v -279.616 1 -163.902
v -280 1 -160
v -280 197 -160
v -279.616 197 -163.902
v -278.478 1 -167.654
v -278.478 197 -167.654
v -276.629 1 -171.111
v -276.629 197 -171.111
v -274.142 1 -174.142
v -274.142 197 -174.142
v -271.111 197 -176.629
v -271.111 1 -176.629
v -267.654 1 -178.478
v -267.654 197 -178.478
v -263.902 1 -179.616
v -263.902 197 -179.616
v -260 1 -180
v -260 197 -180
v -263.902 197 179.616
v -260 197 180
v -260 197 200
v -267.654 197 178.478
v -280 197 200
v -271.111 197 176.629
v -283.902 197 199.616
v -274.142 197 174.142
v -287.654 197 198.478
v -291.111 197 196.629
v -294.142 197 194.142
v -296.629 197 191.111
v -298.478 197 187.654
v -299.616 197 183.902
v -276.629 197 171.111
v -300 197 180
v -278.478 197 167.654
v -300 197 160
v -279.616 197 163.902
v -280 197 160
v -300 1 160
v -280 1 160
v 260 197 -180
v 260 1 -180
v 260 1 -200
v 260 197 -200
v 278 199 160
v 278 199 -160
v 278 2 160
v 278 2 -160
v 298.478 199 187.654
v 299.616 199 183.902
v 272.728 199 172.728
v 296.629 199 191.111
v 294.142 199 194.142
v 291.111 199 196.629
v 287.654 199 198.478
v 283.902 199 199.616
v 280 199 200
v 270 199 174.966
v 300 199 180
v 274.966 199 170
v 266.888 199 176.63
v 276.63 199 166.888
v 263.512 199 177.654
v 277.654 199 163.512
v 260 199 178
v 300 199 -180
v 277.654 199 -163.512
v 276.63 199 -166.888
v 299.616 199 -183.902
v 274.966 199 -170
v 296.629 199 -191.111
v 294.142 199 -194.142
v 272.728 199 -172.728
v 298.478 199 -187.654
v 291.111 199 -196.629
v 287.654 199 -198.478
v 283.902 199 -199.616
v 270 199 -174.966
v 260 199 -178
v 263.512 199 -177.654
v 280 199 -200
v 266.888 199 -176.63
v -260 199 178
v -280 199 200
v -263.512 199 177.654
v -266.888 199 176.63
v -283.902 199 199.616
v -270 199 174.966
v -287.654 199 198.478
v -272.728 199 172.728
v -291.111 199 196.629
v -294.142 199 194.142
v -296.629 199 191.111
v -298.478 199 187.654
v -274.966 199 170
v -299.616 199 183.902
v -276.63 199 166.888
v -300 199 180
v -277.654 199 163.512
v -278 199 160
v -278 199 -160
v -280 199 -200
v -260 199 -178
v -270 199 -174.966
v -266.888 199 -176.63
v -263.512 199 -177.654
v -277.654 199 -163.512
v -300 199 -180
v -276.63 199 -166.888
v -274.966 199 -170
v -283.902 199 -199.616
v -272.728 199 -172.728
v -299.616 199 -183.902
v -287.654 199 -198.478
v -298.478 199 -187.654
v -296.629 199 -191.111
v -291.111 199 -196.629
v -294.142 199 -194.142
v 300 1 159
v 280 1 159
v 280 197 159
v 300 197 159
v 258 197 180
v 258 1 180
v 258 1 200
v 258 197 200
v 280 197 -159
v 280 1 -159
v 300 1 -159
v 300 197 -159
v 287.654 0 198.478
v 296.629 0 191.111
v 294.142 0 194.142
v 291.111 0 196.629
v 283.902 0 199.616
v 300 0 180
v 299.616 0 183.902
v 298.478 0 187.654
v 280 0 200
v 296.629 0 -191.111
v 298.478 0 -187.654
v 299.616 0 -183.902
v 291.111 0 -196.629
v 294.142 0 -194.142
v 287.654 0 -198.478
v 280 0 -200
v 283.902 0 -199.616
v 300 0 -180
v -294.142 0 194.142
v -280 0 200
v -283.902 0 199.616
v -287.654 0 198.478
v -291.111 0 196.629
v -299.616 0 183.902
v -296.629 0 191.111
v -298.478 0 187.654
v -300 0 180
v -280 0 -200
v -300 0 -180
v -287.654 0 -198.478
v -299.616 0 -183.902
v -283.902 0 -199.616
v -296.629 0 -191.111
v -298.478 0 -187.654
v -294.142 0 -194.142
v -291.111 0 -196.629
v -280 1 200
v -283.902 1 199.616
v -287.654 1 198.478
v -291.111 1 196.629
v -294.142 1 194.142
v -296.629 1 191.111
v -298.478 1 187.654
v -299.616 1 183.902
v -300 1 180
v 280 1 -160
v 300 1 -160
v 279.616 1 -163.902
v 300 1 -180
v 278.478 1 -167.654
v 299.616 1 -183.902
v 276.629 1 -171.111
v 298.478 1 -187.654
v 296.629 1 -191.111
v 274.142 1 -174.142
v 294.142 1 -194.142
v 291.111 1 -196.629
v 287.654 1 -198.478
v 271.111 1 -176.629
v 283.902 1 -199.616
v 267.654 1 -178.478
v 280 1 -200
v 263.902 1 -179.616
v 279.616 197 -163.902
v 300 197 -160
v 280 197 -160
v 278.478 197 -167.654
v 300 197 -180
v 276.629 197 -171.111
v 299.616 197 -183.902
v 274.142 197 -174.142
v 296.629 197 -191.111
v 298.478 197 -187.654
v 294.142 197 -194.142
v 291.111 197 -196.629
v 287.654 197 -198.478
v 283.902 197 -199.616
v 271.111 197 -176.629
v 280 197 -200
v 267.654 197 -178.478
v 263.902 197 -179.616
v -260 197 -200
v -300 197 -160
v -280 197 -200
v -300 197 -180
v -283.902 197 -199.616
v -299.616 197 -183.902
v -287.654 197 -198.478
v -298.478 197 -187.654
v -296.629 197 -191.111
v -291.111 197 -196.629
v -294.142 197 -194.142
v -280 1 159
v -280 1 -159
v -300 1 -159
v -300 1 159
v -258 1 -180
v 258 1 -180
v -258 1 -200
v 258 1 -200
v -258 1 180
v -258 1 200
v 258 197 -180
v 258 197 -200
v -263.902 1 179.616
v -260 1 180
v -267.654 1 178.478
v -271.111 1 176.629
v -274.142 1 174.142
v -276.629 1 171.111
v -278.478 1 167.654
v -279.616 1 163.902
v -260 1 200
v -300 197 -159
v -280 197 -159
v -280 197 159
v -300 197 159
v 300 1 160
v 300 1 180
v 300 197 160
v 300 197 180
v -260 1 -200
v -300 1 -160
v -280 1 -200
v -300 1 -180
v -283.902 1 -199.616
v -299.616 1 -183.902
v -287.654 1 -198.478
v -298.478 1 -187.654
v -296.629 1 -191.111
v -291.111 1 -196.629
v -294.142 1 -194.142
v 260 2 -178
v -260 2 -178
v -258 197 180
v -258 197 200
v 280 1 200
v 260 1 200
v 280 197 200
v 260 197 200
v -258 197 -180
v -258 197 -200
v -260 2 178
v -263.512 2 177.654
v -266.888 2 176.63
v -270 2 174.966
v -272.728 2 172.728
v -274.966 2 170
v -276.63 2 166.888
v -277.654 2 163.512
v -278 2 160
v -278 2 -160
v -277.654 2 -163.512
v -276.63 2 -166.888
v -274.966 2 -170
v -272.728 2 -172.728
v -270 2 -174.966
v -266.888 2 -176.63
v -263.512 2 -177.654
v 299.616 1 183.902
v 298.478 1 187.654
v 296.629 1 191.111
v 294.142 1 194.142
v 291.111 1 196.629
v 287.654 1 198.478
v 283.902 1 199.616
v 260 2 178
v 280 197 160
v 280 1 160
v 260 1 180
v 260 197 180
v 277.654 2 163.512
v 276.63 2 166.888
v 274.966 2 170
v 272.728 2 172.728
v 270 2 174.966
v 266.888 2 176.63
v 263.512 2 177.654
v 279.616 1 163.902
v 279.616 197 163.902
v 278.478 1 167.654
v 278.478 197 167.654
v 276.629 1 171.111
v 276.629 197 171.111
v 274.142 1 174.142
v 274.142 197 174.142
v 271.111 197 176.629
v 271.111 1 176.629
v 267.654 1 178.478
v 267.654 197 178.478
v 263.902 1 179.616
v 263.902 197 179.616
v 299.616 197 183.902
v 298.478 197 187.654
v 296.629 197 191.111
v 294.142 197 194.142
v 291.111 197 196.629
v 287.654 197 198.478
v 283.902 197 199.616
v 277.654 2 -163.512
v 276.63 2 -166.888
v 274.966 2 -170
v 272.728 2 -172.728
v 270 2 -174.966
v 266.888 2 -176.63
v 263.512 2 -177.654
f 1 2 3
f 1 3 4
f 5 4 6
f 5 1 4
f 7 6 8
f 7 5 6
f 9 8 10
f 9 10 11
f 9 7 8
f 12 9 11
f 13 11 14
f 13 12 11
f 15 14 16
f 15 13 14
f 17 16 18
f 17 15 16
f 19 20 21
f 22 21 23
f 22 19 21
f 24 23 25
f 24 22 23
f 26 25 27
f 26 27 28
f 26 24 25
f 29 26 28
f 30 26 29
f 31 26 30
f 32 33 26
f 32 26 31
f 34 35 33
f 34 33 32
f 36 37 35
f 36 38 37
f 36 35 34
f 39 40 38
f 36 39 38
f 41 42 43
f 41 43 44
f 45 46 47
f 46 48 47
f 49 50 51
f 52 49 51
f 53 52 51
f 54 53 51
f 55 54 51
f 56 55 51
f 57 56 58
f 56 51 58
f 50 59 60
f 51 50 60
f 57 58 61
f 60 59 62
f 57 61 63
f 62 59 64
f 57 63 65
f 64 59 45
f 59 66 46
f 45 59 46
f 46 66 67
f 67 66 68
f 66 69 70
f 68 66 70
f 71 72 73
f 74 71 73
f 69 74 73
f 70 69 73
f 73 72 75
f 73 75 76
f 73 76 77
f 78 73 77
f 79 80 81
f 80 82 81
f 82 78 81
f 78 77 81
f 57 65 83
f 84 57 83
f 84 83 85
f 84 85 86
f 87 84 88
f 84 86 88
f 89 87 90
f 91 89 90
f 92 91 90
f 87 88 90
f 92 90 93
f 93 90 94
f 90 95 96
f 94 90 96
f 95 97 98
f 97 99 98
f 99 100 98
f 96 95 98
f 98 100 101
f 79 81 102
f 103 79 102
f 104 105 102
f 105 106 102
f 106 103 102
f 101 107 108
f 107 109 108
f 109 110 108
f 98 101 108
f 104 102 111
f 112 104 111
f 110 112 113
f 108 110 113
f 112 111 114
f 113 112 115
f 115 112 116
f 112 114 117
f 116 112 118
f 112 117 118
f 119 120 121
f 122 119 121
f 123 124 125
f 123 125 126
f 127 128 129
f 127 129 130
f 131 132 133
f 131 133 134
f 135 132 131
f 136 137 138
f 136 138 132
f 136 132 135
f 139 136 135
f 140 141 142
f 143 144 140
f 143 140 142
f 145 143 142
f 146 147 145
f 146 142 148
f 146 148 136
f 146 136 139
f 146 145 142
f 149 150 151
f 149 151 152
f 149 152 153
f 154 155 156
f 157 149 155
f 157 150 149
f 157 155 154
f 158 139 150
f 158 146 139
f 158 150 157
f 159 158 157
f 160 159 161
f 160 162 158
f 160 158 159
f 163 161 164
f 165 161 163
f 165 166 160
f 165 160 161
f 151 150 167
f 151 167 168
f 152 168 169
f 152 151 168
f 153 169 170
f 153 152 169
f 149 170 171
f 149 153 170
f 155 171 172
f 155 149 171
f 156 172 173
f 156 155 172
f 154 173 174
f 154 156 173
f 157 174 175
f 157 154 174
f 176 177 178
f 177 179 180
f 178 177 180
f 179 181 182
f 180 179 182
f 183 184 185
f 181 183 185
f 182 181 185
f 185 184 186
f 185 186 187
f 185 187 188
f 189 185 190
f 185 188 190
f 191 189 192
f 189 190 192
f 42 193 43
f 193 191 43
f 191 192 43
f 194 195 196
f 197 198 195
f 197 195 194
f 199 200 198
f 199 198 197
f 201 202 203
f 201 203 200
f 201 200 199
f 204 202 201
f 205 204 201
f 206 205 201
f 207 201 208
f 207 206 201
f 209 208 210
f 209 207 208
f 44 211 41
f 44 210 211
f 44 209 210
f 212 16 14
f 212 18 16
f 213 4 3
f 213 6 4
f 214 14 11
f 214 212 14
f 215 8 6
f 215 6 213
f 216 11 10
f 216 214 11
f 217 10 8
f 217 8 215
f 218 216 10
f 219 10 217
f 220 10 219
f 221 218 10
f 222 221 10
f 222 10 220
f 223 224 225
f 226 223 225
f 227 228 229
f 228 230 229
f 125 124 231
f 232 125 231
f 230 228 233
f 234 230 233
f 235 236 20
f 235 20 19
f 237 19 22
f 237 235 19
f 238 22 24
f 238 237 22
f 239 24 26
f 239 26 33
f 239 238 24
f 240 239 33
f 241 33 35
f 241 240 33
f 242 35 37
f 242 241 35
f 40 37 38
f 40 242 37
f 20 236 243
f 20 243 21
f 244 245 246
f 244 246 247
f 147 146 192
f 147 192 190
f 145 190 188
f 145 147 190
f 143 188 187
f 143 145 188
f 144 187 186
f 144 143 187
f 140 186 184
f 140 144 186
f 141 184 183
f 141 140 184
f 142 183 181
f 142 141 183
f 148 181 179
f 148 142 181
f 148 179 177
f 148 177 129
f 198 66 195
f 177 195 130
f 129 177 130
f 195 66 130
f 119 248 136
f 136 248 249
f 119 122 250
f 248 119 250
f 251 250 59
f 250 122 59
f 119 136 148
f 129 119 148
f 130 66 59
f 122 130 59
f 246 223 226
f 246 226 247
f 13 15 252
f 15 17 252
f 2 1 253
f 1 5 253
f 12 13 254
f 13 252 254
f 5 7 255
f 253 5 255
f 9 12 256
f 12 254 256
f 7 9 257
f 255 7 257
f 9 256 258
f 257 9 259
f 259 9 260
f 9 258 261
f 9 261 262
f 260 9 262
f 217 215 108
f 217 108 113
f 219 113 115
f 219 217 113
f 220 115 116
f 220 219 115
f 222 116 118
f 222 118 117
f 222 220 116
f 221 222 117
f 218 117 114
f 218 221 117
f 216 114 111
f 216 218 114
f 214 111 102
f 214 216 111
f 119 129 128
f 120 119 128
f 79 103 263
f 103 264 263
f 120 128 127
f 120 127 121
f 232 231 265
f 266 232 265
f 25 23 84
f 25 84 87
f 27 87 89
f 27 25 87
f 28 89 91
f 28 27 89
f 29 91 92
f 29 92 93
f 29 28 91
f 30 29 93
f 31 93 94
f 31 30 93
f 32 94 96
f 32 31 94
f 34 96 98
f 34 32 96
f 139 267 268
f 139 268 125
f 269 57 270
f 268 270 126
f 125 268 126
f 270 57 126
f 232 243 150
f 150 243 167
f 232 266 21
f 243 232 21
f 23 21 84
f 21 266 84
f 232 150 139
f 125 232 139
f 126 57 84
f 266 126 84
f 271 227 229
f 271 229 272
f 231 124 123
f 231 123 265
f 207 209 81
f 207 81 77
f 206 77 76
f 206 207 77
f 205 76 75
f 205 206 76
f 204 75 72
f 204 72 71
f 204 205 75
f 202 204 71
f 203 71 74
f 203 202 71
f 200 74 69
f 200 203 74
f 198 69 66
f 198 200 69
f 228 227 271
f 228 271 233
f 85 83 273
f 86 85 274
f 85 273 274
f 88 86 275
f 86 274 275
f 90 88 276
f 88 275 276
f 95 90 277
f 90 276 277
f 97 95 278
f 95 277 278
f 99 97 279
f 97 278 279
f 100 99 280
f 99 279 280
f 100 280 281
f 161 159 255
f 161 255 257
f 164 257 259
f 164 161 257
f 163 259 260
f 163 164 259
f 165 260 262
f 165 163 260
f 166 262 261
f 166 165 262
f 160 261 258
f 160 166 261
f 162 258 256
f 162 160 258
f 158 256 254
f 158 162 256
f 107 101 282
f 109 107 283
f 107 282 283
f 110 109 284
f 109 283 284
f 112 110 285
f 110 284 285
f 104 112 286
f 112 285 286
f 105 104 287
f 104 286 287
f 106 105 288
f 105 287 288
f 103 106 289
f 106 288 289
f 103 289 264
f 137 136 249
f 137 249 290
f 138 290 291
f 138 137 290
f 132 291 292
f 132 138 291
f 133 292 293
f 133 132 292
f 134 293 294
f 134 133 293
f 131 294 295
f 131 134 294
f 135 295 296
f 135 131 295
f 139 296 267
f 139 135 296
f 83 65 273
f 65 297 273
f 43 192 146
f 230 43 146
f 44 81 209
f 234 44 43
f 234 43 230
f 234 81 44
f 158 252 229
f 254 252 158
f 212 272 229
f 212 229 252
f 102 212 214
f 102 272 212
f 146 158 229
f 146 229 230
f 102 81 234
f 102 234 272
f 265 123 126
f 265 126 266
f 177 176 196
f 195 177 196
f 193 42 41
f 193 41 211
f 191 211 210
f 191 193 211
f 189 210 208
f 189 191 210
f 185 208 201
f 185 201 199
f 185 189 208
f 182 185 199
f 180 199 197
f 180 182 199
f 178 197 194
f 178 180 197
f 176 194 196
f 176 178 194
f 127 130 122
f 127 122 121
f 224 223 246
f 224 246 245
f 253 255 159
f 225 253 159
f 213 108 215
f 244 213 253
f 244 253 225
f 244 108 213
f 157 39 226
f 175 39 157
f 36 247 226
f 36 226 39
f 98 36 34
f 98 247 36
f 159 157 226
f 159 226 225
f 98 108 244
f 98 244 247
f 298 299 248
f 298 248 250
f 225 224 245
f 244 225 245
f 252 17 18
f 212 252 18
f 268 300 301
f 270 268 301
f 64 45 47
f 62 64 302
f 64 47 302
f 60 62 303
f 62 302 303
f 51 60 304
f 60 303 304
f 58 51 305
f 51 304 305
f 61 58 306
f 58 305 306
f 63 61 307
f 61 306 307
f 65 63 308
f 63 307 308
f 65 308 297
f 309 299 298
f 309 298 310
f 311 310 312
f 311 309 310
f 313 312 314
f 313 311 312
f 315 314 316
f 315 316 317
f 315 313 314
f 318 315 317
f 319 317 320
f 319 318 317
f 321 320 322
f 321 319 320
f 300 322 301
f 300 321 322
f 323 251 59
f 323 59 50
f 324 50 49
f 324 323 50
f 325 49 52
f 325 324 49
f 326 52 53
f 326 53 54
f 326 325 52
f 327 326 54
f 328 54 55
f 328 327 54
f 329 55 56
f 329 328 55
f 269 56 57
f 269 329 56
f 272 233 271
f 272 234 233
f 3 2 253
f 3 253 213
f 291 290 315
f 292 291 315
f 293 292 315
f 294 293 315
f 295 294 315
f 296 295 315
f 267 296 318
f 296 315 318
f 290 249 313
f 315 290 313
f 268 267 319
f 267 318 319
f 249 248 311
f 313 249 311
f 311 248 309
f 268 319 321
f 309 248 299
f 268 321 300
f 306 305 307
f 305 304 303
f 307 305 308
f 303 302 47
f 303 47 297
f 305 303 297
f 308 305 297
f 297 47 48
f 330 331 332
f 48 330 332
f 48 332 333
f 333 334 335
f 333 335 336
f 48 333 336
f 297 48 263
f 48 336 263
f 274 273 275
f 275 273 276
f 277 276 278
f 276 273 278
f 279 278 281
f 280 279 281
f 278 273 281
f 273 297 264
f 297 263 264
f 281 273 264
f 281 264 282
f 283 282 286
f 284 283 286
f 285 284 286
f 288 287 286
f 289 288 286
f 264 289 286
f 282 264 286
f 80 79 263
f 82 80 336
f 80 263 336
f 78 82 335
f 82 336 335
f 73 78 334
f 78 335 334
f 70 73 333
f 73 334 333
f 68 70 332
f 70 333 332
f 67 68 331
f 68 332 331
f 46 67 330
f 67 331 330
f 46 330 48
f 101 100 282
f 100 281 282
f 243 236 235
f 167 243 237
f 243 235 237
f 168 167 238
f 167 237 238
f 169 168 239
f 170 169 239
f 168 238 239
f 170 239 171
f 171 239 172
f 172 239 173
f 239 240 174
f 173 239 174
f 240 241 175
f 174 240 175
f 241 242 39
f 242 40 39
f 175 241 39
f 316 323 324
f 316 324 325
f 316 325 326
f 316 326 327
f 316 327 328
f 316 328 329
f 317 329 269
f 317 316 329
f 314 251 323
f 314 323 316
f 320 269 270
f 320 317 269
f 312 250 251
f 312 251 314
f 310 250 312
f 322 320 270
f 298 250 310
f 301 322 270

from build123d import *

# Parameters (mm, degrees)
BOSS_EXTRU_4_DEPTH        = 1
BOSS_EXTRU_5_DEPTH        = 198
COQUE2_T                  = -2
BOSS_EXTRU_6_DEPTH        = 2
ENL_V_START               = -2
ENL_V_MAT_EXTRU_3_DEPTH   = 2
ESQUISSE18_W              = 1
ESQUISSE18_H              = 196
BOSS_EXTRU_7_DEPTH        = 20
SYM_TRIE3_COPY_1_SKETCH_W = 1
SYM_TRIE3_COPY_1_SKETCH_H = 196
SYM_TRIE3_COPY_1_DEPTH    = 20
ESQUISSE19_W              = 2
ESQUISSE19_H              = 196
BOSS_EXTRU_8_DEPTH        = 20
SYM_TRIE5_COPY_1_SKETCH_W = 2
SYM_TRIE5_COPY_1_SKETCH_H = 196
SYM_TRIE5_COPY_1_DEPTH    = 20


with BuildPart() as part:
    # Esquisse1 → Boss.-Extru.4 (new body)
    with BuildSketch(Plane(origin=(0, 0, 0), x_dir=(1, 0, 0), z_dir=(0, 1, 0))):
        with BuildLine():
            Line((-280, 200), (280, 200))
            ThreePointArc((280, 200), (294.142135624, 194.142135624), (300, 180))
            Line((300, 180), (300, -180))
            ThreePointArc((300, -180), (294.142135624, -194.142135624), (280, -200))
            Line((280, -200), (-280, -200))
            ThreePointArc((-280, -200), (-294.142135624, -194.142135624), (-300, -180))
            Line((-300, -180), (-300, 180))
            ThreePointArc((-300, 180), (-294.142135624, 194.142135624), (-280, 200))
        make_face()
    boss_extru_4 = extrude(amount=BOSS_EXTRU_4_DEPTH)

    # Esquisse3 → Boss.-Extru.5 (add)
    with BuildSketch(Plane(origin=(0, 1, 0), x_dir=(1, 0, 0), z_dir=(0, 1, 0))):
        with BuildLine():
            Line((-260, 180), (260, 180))
            ThreePointArc((260, 180), (274.142135624, 174.142135624), (280, 160))
            Line((280, 160), (280, -160))
            ThreePointArc((280, -160), (274.142135624, -174.142135624), (260, -180))
            Line((260, -180), (-260, -180))
            ThreePointArc((-260, -180), (-274.142135624, -174.142135624), (-280, -160))
            Line((-280, -160), (-280, 160))
            ThreePointArc((-280, 160), (-274.142135624, 174.142135624), (-260, 180))
        make_face()
    extrude(amount=BOSS_EXTRU_5_DEPTH)

    # Coque2
    coque2_openings = [part.faces().sort_by_distance(p)[0] for p in [
        (0, 199, 0),
    ]]
    offset(amount=COQUE2_T, openings=coque2_openings, kind=Kind.INTERSECTION)



with BuildPart() as body_2:
    # Esquisse12 → Boss.-Extru.6 (new body)
    with BuildSketch(Plane(origin=(0, 197, 0), x_dir=(1, 0, 0), z_dir=(0, 1, 0))):
        with BuildLine():
            Line((-280, 200), (280, 200))
            ThreePointArc((280, 200), (294.142135624, 194.142135624), (300, 180))
            Line((300, 180), (300, -180))
            ThreePointArc((300, -180), (294.142135624, -194.142135624), (280, -200))
            Line((280, -200), (-280, -200))
            ThreePointArc((-280, -200), (-294.142135624, -194.142135624), (-300, -180))
            Line((-300, -180), (-300, 180))
            ThreePointArc((-300, 180), (-294.142135624, 194.142135624), (-280, 200))
        make_face()
    extrude(amount=BOSS_EXTRU_6_DEPTH)

    # Esquisse17 → Enlèv. mat.-Extru.3 (cut)
    with BuildSketch(Plane(origin=(0, 199, 0), x_dir=(1, 0, 0), z_dir=(0, 1, 0)).offset(ENL_V_START)):
        with BuildLine():
            Line((-260, 180), (260, 180))
            ThreePointArc((260, 180), (274.142135624, 174.142135624), (280, 160))
            Line((280, 160), (280, -160))
            ThreePointArc((280, -160), (274.142135624, -174.142135624), (260, -180))
            Line((260, -180), (-260, -180))
            ThreePointArc((-260, -180), (-274.142135624, -174.142135624), (-280, -160))
            Line((-280, -160), (-280, 160))
            ThreePointArc((-280, 160), (-274.142135624, 174.142135624), (-260, 180))
        make_face()
    extrude(amount=ENL_V_MAT_EXTRU_3_DEPTH, mode=Mode.SUBTRACT)


with BuildPart() as part_1:
    add(part.part)

    add(body_2.part)  # Boss.-Extru.7 merges body 2
    # Esquisse18 → Boss.-Extru.7 (add)
    with BuildSketch(Plane(origin=(280, 0, 0), x_dir=(0, 0, -1), z_dir=(1, 0, 0))):
        with Locations((-159.5, 99)):
            Rectangle(ESQUISSE18_W, ESQUISSE18_H)
    boss_extru_7 = extrude(amount=BOSS_EXTRU_7_DEPTH)


with BuildPart() as sym_trie1_1:
    # Symétrie1: Boss.-Extru.4 across plane
    add(boss_extru_4.mirror(Plane.XY))


with BuildPart() as part_2:
    add(part_1.part)

    # Symétrie1 united with what the copies to: union Symétrie1_1
    add(sym_trie1_1.part)

    # Symétrie2: Boss.-Extru.7 across plane
    add(boss_extru_7.mirror(Plane.XY))

    # Symétrie3: Boss.-Extru.7 across plane
    add(boss_extru_7.mirror(Plane(origin=(0, 0, 0), x_dir=(0, 0, 1), z_dir=(1, 0, 0))))

    # Symétrie3 copy 1 sketch → Symétrie3 copy 1 (add)
    with BuildSketch(Plane.ZY.offset(280)):
        with Locations((-159.5, 99)):
            Rectangle(SYM_TRIE3_COPY_1_SKETCH_W, SYM_TRIE3_COPY_1_SKETCH_H)
    extrude(amount=SYM_TRIE3_COPY_1_DEPTH)

    # Esquisse19 → Boss.-Extru.8 (add)
    with BuildSketch(Plane.XY.offset(180)):
        with Locations((-259, 99)):
            Rectangle(ESQUISSE19_W, ESQUISSE19_H)
    boss_extru_8 = extrude(amount=BOSS_EXTRU_8_DEPTH)

    # Symétrie4: Boss.-Extru.8 across plane
    add(boss_extru_8.mirror(Plane(origin=(0, 0, 0), x_dir=(0, 0, 1), z_dir=(1, 0, 0))))

    # Symétrie5: Boss.-Extru.8 across plane
    add(boss_extru_8.mirror(Plane.XY))

    # Symétrie5 copy 1 sketch → Symétrie5 copy 1 (add)
    with BuildSketch(Plane(origin=(0, 0, -180), x_dir=(-1, 0, 0), z_dir=(0, 0, -1))):
        with Locations((-259, 99)):
            Rectangle(SYM_TRIE5_COPY_1_SKETCH_W, SYM_TRIE5_COPY_1_SKETCH_H)
    extrude(amount=SYM_TRIE5_COPY_1_DEPTH)


solid = part_2.part
